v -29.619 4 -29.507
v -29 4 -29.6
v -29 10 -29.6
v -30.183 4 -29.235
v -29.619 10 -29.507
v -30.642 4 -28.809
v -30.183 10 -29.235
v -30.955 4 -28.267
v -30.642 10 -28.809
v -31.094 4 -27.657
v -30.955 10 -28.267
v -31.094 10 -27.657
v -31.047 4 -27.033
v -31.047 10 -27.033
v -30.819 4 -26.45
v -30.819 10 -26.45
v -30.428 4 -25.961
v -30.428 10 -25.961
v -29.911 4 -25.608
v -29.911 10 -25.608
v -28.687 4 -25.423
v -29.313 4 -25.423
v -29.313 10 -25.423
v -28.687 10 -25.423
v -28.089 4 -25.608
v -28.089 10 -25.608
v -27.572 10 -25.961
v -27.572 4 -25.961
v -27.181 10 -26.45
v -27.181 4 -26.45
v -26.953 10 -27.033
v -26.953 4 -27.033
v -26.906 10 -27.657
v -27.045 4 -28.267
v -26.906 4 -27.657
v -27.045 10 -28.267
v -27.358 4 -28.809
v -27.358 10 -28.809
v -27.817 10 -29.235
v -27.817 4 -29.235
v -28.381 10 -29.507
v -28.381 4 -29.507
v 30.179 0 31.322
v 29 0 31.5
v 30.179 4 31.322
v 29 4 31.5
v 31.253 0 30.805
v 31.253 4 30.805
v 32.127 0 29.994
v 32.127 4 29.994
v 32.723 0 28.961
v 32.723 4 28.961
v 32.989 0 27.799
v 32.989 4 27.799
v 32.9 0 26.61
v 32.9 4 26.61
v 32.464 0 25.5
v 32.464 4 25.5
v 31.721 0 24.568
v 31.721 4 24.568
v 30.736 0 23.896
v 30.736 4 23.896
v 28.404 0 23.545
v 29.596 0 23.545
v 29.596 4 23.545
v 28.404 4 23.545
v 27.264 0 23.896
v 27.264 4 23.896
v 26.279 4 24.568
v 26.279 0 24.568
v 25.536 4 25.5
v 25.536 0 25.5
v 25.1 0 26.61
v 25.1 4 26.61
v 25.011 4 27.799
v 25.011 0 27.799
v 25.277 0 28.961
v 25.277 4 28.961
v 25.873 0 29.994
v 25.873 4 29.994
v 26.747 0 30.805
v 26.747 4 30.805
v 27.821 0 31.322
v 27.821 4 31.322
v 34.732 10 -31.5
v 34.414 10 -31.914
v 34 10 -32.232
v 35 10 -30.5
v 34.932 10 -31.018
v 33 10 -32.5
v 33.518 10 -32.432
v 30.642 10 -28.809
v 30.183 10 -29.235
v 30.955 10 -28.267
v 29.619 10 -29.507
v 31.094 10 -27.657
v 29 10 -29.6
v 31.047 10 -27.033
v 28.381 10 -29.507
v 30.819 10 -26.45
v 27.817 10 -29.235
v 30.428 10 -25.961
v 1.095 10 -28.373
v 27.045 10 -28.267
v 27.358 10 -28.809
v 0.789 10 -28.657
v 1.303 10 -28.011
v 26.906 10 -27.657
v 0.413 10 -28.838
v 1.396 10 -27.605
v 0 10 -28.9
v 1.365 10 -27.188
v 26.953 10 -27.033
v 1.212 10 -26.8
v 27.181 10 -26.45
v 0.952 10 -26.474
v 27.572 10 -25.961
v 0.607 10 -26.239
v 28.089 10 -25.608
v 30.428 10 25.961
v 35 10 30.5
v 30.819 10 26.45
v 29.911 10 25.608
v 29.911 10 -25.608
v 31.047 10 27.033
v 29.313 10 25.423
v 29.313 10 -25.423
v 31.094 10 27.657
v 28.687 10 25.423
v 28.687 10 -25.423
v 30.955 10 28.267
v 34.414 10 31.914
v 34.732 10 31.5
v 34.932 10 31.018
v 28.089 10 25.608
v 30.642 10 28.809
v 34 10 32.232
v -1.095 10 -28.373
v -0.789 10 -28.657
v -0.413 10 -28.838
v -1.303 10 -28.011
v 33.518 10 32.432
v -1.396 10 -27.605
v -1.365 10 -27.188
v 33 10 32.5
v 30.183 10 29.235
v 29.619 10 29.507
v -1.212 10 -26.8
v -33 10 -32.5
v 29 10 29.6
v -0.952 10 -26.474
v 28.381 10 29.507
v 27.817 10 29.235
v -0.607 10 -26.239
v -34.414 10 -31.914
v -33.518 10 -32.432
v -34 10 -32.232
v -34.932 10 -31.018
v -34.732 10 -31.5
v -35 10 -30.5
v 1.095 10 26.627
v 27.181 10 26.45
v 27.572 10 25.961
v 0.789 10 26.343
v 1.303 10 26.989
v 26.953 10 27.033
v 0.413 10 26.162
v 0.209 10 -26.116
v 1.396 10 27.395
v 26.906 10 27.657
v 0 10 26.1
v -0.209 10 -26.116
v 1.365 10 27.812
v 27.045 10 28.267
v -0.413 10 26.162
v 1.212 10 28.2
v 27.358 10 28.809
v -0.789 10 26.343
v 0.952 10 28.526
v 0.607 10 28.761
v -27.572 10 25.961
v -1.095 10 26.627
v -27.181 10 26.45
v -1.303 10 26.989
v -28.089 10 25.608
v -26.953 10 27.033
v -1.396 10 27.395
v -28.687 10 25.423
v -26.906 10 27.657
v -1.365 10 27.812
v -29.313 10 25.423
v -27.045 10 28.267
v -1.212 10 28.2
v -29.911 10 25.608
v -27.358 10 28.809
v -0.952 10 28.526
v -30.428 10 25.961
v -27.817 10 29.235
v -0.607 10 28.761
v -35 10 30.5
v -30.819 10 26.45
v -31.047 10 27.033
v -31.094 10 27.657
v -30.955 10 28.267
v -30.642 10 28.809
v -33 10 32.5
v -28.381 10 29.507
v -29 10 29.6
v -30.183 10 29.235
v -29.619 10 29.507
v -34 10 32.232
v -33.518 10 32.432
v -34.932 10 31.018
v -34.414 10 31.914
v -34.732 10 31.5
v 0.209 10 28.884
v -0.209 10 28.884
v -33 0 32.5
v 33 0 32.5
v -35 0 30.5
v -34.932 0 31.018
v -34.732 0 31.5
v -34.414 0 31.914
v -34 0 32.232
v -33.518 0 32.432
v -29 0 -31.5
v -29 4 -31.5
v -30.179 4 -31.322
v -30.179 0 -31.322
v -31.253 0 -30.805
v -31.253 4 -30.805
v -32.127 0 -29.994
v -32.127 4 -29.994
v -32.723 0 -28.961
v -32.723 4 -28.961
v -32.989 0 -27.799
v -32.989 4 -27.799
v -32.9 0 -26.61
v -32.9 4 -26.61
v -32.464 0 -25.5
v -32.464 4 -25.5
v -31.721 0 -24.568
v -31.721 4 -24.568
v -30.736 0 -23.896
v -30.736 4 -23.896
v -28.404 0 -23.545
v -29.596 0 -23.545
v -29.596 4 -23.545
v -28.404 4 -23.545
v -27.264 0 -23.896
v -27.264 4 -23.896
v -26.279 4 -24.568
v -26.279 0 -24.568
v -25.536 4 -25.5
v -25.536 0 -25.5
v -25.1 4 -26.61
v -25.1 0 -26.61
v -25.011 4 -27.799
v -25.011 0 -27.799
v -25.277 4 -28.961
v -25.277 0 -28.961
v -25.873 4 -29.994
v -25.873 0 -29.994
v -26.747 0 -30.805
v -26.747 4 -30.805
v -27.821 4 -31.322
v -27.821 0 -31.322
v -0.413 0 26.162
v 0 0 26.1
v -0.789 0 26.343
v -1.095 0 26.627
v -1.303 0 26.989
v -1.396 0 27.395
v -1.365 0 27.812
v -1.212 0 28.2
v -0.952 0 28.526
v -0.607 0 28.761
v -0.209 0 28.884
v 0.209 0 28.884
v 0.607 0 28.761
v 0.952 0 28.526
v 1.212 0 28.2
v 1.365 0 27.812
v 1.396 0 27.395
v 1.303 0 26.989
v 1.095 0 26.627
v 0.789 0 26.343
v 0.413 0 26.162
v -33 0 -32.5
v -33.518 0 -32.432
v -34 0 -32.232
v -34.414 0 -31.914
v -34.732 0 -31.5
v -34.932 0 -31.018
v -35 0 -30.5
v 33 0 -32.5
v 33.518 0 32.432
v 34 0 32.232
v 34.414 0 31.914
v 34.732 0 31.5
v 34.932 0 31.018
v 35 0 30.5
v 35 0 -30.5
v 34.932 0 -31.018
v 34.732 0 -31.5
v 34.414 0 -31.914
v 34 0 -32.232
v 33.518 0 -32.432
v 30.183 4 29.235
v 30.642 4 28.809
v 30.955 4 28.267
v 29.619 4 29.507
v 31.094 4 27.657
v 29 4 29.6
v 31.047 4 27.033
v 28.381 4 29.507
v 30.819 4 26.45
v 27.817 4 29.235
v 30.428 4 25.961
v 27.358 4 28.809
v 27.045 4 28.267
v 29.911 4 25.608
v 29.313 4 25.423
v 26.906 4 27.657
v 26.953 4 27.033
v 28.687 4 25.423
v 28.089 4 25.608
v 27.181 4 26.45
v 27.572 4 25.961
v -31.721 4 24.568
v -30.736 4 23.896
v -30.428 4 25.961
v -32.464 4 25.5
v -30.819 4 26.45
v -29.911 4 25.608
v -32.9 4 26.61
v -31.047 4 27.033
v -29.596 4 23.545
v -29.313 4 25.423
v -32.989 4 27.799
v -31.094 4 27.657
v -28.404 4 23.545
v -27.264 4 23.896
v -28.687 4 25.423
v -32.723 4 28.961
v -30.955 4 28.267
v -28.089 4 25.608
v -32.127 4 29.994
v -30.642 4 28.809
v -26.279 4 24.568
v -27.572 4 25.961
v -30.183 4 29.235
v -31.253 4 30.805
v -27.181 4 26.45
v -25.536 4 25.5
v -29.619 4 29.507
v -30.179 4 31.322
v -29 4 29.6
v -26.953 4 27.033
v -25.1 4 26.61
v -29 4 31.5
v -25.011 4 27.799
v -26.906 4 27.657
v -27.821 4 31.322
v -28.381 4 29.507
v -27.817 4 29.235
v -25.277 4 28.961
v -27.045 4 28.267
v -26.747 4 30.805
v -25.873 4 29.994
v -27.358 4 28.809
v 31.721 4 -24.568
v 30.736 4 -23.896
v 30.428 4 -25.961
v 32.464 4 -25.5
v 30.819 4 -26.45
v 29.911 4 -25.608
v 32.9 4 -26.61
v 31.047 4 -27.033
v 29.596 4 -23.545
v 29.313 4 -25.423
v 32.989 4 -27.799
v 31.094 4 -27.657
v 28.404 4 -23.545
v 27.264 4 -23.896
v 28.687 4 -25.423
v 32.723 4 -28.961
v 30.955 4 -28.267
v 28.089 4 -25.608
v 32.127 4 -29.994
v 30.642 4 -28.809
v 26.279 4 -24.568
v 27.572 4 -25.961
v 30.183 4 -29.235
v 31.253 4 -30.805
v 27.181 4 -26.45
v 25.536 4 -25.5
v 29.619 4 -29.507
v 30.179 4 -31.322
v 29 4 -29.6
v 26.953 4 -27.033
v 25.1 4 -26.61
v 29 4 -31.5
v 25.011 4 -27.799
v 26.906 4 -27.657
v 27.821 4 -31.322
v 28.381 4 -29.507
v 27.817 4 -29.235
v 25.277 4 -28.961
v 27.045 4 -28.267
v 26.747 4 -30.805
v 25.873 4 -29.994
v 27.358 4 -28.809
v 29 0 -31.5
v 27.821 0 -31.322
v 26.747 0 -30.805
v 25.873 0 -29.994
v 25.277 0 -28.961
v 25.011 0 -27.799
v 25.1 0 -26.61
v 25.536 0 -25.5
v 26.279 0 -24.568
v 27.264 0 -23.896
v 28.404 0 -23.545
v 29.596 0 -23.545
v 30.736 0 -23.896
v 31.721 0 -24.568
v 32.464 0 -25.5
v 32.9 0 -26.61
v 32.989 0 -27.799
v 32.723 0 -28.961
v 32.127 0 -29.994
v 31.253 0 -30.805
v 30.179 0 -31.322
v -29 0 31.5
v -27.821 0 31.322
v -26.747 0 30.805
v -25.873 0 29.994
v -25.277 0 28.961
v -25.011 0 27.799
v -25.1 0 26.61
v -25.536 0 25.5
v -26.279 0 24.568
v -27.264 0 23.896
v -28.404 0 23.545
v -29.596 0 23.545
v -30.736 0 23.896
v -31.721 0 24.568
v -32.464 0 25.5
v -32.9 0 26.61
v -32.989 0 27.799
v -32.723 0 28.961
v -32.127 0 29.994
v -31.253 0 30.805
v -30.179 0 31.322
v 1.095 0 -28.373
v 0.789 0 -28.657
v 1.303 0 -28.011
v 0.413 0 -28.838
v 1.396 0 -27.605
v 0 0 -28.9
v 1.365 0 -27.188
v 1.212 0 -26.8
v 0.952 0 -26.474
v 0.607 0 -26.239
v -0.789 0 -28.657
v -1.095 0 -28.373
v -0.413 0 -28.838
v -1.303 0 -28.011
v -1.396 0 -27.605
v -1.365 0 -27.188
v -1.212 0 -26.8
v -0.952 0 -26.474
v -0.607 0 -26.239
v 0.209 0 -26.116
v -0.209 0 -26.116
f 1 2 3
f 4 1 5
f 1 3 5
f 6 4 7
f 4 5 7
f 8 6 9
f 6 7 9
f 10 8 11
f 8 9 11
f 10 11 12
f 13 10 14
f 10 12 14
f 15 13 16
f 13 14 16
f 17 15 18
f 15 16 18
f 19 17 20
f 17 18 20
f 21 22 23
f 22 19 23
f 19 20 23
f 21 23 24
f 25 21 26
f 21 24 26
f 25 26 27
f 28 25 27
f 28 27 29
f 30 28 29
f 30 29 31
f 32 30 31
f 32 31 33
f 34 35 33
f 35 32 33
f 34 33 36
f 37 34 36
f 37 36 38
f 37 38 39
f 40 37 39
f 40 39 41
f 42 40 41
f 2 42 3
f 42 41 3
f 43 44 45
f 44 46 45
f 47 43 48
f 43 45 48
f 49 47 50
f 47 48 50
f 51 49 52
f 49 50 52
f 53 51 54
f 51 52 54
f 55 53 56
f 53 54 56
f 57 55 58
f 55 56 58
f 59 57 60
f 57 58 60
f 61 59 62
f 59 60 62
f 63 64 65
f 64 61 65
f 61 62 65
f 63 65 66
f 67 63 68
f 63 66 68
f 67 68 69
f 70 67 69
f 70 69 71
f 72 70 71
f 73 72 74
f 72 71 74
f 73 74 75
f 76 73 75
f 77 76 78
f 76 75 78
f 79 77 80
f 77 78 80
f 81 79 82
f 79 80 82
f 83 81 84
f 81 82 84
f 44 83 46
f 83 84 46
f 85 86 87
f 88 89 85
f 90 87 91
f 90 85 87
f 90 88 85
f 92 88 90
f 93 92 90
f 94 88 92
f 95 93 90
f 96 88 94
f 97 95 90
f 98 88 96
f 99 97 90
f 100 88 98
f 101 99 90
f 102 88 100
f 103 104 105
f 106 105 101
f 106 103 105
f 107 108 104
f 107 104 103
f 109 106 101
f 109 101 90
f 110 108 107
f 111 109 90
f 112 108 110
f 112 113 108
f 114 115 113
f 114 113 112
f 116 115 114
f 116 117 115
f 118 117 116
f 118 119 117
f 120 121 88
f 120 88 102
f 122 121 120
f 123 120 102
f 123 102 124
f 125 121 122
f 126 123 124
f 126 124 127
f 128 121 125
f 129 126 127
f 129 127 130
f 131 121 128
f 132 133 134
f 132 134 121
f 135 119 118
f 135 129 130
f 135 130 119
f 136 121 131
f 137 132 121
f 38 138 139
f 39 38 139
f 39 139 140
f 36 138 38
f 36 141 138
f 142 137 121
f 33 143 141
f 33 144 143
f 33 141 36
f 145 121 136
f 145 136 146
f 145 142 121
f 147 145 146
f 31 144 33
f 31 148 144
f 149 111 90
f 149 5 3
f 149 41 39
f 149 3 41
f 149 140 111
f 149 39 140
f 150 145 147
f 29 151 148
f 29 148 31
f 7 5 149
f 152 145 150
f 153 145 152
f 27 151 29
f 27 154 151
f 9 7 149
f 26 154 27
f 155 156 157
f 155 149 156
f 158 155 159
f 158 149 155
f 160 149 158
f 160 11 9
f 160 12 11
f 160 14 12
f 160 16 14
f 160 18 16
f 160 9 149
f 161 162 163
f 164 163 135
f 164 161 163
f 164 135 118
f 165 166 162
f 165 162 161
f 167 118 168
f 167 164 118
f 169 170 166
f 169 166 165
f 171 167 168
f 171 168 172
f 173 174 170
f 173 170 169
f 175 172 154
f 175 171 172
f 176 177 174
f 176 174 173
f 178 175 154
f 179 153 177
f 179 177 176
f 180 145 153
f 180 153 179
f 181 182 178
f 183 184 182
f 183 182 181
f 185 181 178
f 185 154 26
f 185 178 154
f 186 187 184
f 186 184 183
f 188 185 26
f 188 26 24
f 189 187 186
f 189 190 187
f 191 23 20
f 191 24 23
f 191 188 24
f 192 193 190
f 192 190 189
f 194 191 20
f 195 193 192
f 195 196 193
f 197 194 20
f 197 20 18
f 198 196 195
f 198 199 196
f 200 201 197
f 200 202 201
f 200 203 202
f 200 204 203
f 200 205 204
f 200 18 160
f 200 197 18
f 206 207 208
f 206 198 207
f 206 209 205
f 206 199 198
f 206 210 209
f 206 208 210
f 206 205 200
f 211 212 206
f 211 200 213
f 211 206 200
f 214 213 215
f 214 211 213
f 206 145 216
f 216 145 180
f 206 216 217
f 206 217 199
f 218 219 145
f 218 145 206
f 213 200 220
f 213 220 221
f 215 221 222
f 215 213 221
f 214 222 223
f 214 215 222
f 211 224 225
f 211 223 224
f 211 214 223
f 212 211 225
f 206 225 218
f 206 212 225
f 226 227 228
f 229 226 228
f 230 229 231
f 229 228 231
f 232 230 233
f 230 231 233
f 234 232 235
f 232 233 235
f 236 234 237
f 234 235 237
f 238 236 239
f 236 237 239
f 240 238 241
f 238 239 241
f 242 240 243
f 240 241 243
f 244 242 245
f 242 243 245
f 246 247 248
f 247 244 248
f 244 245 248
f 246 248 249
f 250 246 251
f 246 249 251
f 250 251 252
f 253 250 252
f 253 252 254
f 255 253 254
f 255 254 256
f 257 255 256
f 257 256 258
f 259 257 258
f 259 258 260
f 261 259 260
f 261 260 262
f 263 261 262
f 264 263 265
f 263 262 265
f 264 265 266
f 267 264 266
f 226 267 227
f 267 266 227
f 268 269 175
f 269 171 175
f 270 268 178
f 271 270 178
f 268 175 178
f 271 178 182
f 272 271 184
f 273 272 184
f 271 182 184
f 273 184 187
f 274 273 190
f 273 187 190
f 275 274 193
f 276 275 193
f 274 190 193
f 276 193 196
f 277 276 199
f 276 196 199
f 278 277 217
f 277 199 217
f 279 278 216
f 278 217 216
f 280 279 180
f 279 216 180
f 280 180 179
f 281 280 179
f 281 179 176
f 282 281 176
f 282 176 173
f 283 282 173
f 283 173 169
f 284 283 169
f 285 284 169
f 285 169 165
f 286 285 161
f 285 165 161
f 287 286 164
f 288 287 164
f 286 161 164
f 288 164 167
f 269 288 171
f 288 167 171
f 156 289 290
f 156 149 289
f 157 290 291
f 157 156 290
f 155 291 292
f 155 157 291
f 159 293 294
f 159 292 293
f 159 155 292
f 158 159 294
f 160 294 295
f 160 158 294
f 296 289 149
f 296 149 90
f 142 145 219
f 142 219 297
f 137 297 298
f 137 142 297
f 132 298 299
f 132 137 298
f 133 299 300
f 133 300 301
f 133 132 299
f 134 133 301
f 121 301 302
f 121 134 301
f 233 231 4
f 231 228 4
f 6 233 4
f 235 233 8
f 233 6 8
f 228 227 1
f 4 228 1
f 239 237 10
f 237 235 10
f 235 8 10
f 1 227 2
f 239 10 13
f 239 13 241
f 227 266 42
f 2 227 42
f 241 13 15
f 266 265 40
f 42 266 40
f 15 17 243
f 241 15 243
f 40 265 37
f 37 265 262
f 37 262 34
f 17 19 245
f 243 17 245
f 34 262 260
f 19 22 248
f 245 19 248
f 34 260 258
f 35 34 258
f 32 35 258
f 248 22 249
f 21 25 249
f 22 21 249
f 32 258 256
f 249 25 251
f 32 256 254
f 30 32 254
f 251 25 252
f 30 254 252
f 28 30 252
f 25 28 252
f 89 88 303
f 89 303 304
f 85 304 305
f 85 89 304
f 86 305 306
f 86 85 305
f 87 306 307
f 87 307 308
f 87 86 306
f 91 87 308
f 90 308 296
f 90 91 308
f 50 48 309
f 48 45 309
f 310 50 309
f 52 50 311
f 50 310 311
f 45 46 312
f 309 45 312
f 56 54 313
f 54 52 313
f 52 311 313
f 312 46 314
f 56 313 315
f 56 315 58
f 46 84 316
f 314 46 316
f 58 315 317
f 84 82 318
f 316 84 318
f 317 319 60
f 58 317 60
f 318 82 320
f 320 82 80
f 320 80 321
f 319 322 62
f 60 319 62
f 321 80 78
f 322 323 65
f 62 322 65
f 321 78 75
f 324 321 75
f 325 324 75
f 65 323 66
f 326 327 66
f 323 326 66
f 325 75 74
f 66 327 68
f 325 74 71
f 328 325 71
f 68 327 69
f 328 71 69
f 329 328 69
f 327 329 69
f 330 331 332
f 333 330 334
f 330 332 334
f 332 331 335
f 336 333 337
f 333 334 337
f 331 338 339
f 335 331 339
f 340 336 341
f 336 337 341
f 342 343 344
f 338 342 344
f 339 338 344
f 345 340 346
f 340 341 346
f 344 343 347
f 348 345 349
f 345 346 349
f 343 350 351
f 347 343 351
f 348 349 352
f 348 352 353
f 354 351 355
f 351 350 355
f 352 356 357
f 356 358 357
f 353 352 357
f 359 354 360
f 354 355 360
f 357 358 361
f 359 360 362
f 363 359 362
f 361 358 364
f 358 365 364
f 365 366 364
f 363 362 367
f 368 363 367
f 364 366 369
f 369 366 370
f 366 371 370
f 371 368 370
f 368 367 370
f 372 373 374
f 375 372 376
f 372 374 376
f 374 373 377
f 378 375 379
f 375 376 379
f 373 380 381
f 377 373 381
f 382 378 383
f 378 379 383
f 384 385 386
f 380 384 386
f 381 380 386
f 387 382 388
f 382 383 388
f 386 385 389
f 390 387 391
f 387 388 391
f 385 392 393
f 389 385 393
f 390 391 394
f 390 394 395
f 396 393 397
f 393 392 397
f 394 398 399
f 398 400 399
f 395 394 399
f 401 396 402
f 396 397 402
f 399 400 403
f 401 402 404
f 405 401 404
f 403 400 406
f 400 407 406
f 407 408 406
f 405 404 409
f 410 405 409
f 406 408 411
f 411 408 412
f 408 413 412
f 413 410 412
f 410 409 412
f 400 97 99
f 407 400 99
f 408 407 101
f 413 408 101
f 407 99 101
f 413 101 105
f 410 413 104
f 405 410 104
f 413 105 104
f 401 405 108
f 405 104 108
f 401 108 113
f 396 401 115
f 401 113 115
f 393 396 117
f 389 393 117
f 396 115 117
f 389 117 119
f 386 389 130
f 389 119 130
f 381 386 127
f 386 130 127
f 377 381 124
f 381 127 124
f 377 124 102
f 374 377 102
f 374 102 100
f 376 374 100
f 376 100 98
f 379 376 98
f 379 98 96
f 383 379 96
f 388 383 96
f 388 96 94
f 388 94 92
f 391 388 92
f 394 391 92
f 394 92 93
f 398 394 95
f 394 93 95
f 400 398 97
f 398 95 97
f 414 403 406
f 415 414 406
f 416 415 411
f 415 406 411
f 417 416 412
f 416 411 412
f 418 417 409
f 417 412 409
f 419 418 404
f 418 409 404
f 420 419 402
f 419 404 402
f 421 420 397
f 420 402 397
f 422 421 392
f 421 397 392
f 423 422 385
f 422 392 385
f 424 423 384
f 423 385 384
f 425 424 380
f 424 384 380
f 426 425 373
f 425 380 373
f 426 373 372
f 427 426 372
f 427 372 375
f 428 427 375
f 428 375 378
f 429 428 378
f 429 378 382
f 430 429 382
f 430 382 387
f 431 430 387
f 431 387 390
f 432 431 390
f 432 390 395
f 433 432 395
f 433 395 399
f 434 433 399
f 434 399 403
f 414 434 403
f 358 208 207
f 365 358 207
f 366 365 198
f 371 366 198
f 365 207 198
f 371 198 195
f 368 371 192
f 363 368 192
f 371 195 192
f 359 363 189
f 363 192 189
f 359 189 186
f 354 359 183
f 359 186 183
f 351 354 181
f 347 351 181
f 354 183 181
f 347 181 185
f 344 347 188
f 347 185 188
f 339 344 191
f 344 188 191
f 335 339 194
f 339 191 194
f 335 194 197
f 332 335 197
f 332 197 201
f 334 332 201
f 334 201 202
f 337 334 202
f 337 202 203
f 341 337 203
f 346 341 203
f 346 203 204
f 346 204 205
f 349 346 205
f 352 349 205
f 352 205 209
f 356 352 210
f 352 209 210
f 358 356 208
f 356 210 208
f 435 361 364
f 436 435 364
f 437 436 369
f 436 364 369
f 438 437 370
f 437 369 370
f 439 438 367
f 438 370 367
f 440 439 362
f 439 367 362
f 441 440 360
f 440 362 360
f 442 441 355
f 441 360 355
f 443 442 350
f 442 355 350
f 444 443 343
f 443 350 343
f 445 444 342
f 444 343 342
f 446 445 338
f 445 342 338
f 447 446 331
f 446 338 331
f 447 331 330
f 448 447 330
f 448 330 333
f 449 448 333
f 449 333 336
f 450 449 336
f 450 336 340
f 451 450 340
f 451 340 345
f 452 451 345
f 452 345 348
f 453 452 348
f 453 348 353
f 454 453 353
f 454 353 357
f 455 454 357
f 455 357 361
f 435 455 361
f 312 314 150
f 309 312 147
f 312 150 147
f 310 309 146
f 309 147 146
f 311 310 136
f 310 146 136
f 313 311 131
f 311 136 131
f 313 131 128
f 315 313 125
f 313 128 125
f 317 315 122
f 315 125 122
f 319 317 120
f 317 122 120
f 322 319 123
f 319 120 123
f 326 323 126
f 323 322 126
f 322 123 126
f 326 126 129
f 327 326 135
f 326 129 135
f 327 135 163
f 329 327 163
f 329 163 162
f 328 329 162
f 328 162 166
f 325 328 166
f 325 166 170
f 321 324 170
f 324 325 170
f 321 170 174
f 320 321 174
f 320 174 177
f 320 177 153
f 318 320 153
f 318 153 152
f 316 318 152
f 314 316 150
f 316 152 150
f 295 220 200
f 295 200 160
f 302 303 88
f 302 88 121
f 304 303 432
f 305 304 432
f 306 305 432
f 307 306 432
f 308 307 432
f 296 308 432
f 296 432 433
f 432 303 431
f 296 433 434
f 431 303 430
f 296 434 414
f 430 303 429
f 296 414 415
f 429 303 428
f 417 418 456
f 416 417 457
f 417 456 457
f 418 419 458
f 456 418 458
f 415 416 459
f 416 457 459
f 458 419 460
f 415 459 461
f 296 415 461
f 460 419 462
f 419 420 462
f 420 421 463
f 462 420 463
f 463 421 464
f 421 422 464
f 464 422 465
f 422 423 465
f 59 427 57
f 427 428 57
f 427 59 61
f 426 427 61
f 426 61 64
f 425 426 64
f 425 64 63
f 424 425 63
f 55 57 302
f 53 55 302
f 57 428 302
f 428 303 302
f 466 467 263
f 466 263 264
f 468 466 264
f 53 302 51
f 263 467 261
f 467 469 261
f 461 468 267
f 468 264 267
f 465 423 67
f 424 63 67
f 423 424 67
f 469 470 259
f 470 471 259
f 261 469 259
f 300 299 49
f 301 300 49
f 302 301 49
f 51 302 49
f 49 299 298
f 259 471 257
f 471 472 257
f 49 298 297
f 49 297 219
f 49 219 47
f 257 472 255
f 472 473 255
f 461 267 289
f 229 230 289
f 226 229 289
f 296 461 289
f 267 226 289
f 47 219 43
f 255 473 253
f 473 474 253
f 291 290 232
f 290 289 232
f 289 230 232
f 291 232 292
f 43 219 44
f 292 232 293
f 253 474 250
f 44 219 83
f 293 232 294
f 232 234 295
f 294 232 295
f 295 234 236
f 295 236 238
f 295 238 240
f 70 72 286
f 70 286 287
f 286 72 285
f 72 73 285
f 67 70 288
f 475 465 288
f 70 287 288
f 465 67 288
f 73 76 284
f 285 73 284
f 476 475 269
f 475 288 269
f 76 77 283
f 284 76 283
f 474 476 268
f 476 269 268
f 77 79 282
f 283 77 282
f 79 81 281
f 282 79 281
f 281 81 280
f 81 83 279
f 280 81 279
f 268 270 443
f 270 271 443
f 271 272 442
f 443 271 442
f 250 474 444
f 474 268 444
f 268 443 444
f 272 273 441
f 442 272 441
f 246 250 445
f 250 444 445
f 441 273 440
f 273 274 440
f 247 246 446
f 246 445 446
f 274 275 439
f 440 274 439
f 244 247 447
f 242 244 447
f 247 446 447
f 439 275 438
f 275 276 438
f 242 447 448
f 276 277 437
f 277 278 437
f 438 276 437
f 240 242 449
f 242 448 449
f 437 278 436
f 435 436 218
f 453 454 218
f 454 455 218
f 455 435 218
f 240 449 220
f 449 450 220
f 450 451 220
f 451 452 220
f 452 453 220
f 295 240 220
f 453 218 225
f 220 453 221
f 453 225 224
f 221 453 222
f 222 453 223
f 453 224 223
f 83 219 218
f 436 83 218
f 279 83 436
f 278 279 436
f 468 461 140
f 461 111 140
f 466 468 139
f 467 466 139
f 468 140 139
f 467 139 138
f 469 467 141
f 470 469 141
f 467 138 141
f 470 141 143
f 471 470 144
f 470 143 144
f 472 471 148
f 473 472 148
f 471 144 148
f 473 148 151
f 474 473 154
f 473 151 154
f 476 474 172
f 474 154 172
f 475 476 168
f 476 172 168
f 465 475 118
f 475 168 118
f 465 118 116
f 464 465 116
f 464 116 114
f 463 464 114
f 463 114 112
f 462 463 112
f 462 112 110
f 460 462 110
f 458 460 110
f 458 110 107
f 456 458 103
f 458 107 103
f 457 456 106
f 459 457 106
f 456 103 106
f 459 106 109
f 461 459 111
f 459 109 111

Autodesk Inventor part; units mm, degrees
ref_plane "YZ Plane" through (0, 0, 0) normal (1, 0, 0) x (0, 1, 0)
ref_plane "XZ Plane" through (0, 0, 0) normal (0, 1, 0) x (-1, 0, 0)
ref_plane "XY Plane" through (0, 0, 0) normal (0, 0, 1) x (1, 0, 0)
sketch "Sketch1" plane through (0, 0, 0) normal (0, 1, 0) x (-1, 0, 0)
  line L0 (-35, 32.5) -> (35, 32.5)
  line L1 (35, 32.5) -> (35, -32.5)
  line L2 (35, -32.5) -> (-35, -32.5)
  line L3 (-35, -32.5) -> (-35, 32.5)
  line L4 (-35, 32.5) -> (35, -32.5) construction
  line L5 (35, 32.5) -> (-35, -32.5) construction
  line L6 (-35, 22.5) -> (35, 22.5)
  line L7 (35, 22.5) -> (35, -22.5)
  line L8 (35, -22.5) -> (-35, -22.5)
  line L9 (-35, -22.5) -> (-35, 22.5)
  line L10 (-35, 22.5) -> (35, -22.5) construction
  line L11 (35, 22.5) -> (-35, -22.5) construction
  point P0 (0, 0)
  dimension "d0" = 70
  dimension "d1" = 65
  dimension "d2" = 10
extrude "Extrusion1" add sketch "Sketch1" along normal blind 10
sketch "Sketch2" plane through (0, 0, 0) normal (0, -1, 0) x (1, 0, 0)
  line L0 (35, 32.5) -> (35, -32.5) projected
  line L1 (-35, 32.5) -> (35, 32.5) projected
  line L2 (-35, -32.5) -> (-35, 32.5) projected
  line L3 (35, -32.5) -> (-35, -32.5) projected
  line L4 (-35, 22.5) -> (35, 22.5)
  line L5 (35, 22.5) -> (35, -22.5)
  line L6 (35, -22.5) -> (-35, -22.5)
  line L7 (-35, -22.5) -> (-35, 22.5)
  line L8 (-35, 22.5) -> (35, -22.5) construction
  line L9 (35, 22.5) -> (-35, -22.5) construction
  line L10 (35, 32.5) -> (35, -32.5) projected
  line L11 (-35, -22.5) -> (35, -32.5) construction
  line L12 (0, -27.5) -> (29, -27.5) construction
  point P0 (0, 0)
  dimension "d5" = 10
  dimension "d6" = 6
hole "Hole1" at (29, 0, -27.5) direction (0, 1, 0) diameter 4.2 end through all counterbore diameter 8 counterbore depth 4
mirror "Mirror1" about plane through (0, 0, 0) normal (1, 0, 0) of "Hole1"
mirror "Mirror2" about plane through (0, 0, 0) normal (0, 0, 1) of "Hole1", "Mirror1"
fillet "Fillet1" radius 2 4 edges at (35, 5, 32.5) (-35, 5, 32.5) (-35, 5, -32.5) (35, 5, -32.5)
sketch "Sketch3" plane through (0, 0, 0) normal (0, -1, 0) x (1, 0, 0)
  arc A0 (33, -32.5) -> (35, -30.5) centre (33, -30.5) ccw projected
  line L0 (35, 30.5) -> (35, -30.5) projected
  arc A1 (35, 30.5) -> (33, 32.5) centre (33, 30.5) ccw projected
  line L1 (-33, 32.5) -> (33, 32.5) projected
  arc A2 (-33, 32.5) -> (-35, 30.5) centre (-33, 30.5) ccw projected
  line L2 (-35, -30.5) -> (-35, 30.5) projected
  arc A3 (-35, -30.5) -> (-33, -32.5) centre (-33, -30.5) ccw projected
  line L3 (33, -32.5) -> (-33, -32.5) projected
  circle A4 centre (-29, 27.5) radius 4 projected
  circle A5 centre (29, 27.5) radius 4 projected
  circle A6 centre (-29, -27.5) radius 4 projected
  circle A7 centre (29, -27.5) radius 4 projected
  circle A8 centre (29, 27.5) radius 2.1 projected
  circle A9 centre (-29, 27.5) radius 4 projected
  line L4 (29, 27.5) -> (-29, 27.5)
  circle A10 centre (29, -27.5) radius 2.1 projected
  line L5 (29, -27.5) -> (-29, -27.5)
  point P0 (0, 0)
  point P1 (0, 27.5)
  point P2 (0, -27.5)
hole "Hole2" at (0, 0, 27.5) at (0, 0, -27.5) direction (0, 1, 0) diameter 2.8 end through all
properties part number "23_Nap_hop_so_ngang" material "Stainless Steel, Austenitic"
